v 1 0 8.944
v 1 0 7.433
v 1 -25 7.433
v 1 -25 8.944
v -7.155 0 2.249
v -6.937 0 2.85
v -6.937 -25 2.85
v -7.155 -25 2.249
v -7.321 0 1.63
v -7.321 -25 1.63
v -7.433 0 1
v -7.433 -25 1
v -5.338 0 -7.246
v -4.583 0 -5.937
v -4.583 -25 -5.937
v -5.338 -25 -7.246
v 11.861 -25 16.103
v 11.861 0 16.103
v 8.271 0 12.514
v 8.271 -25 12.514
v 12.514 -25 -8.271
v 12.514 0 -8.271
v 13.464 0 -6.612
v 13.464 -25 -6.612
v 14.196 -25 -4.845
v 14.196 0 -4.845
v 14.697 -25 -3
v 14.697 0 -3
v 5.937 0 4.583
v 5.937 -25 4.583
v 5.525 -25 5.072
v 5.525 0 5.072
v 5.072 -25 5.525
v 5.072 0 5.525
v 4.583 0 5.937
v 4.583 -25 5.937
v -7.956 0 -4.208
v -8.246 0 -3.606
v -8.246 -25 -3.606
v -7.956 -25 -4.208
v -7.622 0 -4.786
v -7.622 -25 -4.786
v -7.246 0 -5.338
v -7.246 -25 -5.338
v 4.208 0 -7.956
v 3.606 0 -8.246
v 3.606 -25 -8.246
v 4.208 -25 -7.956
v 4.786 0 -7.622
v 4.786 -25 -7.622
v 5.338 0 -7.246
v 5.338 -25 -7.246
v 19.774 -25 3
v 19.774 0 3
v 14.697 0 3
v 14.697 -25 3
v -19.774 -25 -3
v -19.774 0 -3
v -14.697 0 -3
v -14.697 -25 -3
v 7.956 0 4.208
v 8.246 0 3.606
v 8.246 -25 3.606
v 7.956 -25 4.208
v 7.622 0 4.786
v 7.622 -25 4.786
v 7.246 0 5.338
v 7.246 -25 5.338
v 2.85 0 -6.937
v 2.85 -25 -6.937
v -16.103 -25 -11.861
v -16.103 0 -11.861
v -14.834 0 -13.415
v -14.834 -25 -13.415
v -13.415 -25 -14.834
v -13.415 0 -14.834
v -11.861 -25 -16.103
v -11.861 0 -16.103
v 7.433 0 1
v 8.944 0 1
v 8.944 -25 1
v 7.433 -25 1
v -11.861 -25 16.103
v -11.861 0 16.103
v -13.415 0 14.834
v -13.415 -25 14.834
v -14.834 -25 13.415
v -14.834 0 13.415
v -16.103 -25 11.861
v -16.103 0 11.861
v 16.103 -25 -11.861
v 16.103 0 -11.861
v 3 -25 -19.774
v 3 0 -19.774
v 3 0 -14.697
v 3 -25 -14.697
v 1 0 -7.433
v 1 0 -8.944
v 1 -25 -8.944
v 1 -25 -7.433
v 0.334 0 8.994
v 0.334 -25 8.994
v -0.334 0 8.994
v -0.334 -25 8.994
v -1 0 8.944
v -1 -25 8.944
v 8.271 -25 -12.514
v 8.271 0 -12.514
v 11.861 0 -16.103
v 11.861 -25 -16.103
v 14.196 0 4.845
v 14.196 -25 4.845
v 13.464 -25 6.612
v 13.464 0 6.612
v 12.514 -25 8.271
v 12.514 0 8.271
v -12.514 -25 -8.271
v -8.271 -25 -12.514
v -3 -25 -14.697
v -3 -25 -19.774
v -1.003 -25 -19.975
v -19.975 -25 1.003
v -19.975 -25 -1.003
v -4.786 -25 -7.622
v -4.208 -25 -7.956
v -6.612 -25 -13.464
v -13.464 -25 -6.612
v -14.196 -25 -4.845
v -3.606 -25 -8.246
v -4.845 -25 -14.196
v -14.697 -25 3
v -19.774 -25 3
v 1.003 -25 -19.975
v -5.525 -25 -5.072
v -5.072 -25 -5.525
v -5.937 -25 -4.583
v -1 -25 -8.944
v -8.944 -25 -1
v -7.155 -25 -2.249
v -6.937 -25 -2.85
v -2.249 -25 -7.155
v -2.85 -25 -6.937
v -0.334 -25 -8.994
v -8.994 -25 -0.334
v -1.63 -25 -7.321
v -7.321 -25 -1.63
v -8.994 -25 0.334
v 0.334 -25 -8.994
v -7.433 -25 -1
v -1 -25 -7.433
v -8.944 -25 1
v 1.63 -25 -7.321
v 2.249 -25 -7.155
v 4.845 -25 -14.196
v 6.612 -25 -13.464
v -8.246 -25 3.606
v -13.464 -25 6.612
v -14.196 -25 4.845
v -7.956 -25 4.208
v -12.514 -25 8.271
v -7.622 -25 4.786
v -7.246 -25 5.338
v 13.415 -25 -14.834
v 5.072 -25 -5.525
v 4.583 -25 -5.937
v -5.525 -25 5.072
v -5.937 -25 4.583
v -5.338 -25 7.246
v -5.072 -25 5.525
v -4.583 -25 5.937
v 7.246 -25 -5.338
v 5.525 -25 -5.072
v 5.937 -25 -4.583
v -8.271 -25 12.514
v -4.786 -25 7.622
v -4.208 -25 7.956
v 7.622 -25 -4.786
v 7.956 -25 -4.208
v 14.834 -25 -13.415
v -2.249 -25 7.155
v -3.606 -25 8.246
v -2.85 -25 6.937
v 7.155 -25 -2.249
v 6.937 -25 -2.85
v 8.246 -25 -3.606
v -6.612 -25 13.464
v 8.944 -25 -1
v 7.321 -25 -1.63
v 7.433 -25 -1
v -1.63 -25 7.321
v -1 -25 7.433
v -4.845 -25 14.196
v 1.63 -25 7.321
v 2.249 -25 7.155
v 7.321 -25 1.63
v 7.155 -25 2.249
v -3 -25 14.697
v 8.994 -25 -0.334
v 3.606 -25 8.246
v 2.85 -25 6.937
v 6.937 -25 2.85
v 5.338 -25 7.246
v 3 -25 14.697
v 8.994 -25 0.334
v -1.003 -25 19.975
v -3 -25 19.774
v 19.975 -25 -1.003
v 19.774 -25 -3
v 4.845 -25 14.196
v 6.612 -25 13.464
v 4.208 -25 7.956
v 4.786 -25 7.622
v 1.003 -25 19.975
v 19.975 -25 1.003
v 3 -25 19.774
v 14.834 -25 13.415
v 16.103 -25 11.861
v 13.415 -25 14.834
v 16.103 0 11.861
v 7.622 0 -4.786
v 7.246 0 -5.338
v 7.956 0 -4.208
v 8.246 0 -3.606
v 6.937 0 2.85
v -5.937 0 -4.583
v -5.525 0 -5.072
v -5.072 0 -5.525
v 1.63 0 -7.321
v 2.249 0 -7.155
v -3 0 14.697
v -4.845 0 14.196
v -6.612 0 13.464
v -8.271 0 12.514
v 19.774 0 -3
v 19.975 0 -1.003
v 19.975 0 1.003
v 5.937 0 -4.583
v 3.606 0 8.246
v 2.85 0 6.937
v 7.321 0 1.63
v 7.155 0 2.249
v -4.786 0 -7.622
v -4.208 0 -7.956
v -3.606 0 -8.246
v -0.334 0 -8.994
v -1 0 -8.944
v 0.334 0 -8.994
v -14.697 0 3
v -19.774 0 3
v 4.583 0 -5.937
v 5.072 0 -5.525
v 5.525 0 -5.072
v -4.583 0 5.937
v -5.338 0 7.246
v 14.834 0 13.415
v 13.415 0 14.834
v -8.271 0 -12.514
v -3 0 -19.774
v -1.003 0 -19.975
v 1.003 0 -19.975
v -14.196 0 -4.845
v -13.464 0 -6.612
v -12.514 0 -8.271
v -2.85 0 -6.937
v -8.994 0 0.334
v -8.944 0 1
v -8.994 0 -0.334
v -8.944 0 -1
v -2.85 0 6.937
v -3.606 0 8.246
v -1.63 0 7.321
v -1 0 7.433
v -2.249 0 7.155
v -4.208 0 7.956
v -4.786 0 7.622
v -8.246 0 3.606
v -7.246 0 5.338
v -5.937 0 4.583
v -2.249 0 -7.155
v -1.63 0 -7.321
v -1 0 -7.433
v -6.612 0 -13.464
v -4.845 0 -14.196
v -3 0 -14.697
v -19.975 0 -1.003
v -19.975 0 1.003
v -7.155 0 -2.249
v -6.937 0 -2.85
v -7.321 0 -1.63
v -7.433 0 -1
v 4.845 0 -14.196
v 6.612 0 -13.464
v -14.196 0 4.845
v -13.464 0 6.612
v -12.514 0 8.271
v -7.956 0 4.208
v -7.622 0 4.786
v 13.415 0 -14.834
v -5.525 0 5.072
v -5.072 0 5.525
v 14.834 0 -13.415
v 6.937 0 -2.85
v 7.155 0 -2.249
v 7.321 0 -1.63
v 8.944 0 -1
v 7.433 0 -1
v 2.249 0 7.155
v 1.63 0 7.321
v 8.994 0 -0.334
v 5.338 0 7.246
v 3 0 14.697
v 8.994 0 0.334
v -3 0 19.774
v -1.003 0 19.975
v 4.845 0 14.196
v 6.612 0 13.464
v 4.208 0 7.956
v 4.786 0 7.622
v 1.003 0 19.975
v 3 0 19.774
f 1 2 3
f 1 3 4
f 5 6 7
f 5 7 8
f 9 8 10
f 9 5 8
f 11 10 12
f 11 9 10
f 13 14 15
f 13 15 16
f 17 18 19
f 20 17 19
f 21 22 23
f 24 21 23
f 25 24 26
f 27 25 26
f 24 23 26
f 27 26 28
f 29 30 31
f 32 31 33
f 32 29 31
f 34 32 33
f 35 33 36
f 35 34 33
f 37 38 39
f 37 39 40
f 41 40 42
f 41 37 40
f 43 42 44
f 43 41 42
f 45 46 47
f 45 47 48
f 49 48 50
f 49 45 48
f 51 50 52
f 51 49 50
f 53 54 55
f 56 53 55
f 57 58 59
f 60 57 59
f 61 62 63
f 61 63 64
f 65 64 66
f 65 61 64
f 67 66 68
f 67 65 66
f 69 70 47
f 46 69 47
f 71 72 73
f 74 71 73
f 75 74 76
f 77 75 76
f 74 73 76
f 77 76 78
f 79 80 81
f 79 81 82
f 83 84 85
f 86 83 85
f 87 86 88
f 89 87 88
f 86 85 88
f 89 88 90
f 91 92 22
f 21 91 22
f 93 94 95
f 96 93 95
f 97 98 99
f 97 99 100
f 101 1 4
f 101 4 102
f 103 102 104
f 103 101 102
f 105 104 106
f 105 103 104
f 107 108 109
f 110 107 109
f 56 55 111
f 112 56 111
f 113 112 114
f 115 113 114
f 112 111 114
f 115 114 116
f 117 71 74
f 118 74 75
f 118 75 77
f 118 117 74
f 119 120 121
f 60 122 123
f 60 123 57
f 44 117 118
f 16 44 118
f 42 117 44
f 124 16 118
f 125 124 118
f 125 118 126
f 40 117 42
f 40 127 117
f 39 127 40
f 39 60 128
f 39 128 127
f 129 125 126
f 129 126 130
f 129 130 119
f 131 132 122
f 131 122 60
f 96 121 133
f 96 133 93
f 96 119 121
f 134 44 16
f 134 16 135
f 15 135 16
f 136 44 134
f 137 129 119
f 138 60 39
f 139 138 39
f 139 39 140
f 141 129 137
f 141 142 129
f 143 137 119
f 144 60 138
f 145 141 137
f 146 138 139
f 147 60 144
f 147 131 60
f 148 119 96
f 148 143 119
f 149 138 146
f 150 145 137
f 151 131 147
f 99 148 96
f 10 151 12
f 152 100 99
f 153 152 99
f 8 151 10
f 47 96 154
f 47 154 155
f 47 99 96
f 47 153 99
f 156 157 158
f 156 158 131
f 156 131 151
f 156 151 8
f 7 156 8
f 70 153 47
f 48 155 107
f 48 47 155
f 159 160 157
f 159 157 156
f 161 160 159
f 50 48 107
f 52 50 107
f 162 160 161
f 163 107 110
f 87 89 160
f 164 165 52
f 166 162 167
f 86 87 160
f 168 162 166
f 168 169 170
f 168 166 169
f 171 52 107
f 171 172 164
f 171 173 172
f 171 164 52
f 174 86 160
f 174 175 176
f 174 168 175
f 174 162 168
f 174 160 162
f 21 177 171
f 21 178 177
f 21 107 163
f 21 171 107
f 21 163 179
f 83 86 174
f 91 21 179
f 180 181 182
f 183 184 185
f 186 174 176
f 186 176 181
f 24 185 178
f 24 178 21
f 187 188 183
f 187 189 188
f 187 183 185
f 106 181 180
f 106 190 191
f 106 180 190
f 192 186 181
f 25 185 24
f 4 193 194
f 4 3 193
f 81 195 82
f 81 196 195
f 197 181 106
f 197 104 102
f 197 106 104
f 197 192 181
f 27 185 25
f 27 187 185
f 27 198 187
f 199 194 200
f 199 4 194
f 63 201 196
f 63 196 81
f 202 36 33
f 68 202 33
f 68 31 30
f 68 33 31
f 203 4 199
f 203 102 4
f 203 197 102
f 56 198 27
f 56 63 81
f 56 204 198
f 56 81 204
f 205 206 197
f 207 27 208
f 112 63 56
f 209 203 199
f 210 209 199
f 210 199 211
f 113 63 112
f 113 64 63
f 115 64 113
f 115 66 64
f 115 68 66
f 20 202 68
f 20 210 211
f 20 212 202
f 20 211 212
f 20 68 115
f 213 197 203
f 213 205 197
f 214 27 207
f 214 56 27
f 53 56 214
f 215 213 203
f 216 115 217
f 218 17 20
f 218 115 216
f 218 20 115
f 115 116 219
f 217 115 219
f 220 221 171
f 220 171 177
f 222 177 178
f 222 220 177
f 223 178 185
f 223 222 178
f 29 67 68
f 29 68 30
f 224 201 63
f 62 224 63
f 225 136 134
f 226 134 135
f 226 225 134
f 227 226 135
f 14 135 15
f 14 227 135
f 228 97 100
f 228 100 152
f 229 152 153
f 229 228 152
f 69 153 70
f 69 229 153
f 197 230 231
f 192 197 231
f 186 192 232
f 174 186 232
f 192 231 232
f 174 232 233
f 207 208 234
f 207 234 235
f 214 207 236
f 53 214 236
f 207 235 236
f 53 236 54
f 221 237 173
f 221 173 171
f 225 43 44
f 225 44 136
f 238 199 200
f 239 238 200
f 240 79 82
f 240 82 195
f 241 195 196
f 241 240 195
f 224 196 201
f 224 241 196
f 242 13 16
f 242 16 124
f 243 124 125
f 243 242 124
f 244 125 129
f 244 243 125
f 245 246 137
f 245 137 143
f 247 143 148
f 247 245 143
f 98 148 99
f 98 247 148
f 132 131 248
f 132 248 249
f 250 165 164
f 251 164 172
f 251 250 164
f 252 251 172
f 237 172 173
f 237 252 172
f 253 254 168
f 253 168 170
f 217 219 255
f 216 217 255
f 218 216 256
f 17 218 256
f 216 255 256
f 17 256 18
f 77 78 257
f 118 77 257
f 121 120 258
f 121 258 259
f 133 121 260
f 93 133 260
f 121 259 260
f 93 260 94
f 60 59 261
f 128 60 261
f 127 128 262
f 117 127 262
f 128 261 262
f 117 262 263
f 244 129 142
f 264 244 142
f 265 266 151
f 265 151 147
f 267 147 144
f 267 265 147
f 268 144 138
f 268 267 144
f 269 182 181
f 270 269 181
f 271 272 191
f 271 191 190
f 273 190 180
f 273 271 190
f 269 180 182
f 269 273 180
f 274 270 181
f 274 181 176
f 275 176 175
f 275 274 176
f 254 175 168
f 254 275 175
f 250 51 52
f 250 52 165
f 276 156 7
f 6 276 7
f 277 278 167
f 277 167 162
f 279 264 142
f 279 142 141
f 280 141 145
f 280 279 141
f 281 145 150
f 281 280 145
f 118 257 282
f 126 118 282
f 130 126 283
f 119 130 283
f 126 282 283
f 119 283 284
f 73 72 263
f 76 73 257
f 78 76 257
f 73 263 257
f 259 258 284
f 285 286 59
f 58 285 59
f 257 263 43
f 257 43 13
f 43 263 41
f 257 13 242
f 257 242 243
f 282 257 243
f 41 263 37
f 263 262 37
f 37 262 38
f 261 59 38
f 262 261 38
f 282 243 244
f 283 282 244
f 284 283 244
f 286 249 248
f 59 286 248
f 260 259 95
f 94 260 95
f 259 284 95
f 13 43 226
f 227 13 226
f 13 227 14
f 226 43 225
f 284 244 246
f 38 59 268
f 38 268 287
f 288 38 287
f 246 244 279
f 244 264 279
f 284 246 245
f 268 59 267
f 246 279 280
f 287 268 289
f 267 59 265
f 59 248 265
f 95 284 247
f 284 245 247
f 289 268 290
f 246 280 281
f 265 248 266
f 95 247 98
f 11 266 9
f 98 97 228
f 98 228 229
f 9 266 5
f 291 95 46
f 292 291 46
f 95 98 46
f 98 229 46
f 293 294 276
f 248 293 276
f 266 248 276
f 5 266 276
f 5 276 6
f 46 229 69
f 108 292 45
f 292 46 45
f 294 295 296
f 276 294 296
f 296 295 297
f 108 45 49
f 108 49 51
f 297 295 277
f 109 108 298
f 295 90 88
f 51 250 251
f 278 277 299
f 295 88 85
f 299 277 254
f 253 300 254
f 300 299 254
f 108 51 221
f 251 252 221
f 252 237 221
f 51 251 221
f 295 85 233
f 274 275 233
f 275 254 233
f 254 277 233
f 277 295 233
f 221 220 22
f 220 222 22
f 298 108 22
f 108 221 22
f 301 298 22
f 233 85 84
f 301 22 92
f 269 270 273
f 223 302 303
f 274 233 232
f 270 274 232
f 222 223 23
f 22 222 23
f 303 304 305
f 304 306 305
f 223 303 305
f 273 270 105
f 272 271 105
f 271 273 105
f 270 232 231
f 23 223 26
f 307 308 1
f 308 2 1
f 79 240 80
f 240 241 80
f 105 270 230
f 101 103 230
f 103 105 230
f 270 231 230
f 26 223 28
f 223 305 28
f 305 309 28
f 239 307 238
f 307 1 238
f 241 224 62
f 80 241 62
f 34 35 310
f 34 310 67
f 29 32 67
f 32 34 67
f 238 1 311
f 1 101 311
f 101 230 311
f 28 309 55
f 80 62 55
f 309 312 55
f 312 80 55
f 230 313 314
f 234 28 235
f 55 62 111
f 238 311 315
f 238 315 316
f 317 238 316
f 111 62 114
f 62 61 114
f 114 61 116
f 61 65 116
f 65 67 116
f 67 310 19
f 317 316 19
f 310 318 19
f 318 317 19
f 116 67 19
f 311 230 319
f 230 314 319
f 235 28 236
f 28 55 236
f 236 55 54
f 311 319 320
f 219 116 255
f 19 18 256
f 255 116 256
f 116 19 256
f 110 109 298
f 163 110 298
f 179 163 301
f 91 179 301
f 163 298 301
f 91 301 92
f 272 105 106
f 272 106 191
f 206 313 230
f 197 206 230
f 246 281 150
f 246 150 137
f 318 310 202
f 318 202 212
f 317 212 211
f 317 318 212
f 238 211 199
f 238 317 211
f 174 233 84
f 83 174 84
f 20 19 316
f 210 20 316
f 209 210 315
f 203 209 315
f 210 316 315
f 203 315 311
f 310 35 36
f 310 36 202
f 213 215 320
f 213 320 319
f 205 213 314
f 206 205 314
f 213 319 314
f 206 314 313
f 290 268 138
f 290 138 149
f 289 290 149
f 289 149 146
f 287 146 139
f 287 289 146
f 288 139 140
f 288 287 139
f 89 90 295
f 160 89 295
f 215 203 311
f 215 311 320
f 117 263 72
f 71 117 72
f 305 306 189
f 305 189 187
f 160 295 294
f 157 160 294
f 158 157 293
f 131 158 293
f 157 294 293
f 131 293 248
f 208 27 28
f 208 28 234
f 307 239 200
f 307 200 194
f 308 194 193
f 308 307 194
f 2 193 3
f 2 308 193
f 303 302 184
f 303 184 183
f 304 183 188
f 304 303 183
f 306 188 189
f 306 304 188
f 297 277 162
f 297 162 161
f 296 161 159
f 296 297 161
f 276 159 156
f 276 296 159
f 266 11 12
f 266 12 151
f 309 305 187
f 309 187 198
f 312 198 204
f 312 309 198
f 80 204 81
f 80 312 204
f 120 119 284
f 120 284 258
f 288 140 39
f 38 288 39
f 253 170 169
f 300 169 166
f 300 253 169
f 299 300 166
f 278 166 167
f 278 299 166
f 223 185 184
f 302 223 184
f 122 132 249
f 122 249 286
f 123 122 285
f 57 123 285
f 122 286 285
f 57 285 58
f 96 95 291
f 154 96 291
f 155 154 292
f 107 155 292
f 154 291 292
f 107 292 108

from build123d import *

# Parameters (mm, degrees)
F2_DEPTH = 25
F3_DEPTH = 25


with BuildPart() as f2:
    # F1 (on Front) → F2 (new body)
    with BuildSketch(Plane.XZ):
        with BuildLine():
            ThreePointArc((14.696938, -3), (14.924042, -1.507634), (15, 0))
            ThreePointArc((15, 0), (14.924042, 1.507634), (14.696938, 3))
            ThreePointArc((14.696938, 3), (13.858193, 5.740251), (12.513625, 8.270985))
            ThreePointArc((12.513625, 8.270985), (10.606602, 10.606602), (8.270985, 12.513625))
            ThreePointArc((8.270985, 12.513625), (5.740251, 13.858193), (3, 14.696938))
            ThreePointArc((3, 14.696938), (0, 15), (-3, 14.696938))
            ThreePointArc((-3, 14.696938), (-5.740251, 13.858193), (-8.270985, 12.513625))
            ThreePointArc((-8.270985, 12.513625), (-10.606602, 10.606602), (-12.513625, 8.270985))
            ThreePointArc((-12.513625, 8.270985), (-13.858193, 5.740251), (-14.696938, 3))
            ThreePointArc((-14.696938, 3), (-15, 0), (-14.696938, -3))
            ThreePointArc((-14.696938, -3), (-13.858193, -5.740251), (-12.513625, -8.270985))
            ThreePointArc((-12.513625, -8.270985), (-10.606602, -10.606602), (-8.270985, -12.513625))
            ThreePointArc((-8.270985, -12.513625), (-5.740251, -13.858193), (-3, -14.696938))
            ThreePointArc((-3, -14.696938), (0, -15), (3, -14.696938))
            ThreePointArc((3, -14.696938), (5.740251, -13.858193), (8.270985, -12.513625))
            ThreePointArc((8.270985, -12.513625), (10.606602, -10.606602), (12.513625, -8.270985))
            ThreePointArc((12.513625, -8.270985), (13.858193, -5.740251), (14.696938, -3))
        make_face()
        with BuildLine():
            ThreePointArc((-12.513625, 8.270985), (-10.606602, 10.606602), (-8.270985, 12.513625))
            Line((-8.270985, 12.513625), (-11.860811, 16.103452))
            ThreePointArc((-11.860811, 16.103452), (-14.142136, 14.142136), (-16.103452, 11.860811))
            Line((-16.103452, 11.860811), (-12.513625, 8.270985))
        make_face()
        with BuildLine():
            ThreePointArc((-14.696938, -3), (-15, 0), (-14.696938, 3))
            Line((-14.696938, 3), (-19.77372, 3))
            ThreePointArc((-19.77372, 3), (-20, 0), (-19.77372, -3))
            Line((-19.77372, -3), (-14.696938, -3))
        make_face()
        with BuildLine():
            Line((-11.860811, -16.103452), (-8.270985, -12.513625))
            ThreePointArc((-8.270985, -12.513625), (-10.606602, -10.606602), (-12.513625, -8.270985))
            Line((-12.513625, -8.270985), (-16.103452, -11.860811))
            ThreePointArc((-16.103452, -11.860811), (-14.142136, -14.142136), (-11.860811, -16.103452))
        make_face()
        with BuildLine():
            Line((3, -19.77372), (3, -14.696938))
            ThreePointArc((3, -14.696938), (0, -15), (-3, -14.696938))
            Line((-3, -14.696938), (-3, -19.77372))
            ThreePointArc((-3, -19.77372), (0, -20), (3, -19.77372))
        make_face()
        with BuildLine():
            Line((16.103452, -11.860811), (12.513625, -8.270985))
            ThreePointArc((12.513625, -8.270985), (10.606602, -10.606602), (8.270985, -12.513625))
            Line((8.270985, -12.513625), (11.860811, -16.103452))
            ThreePointArc((11.860811, -16.103452), (14.142136, -14.142136), (16.103452, -11.860811))
        make_face()
        with BuildLine():
            ThreePointArc((14.696938, 3), (14.924042, 1.507634), (15, 0))
            ThreePointArc((15, 0), (14.924042, -1.507634), (14.696938, -3))
            Line((14.696938, -3), (19.77372, -3))
            ThreePointArc((19.77372, -3), (20, 0), (19.77372, 3))
            Line((19.77372, 3), (14.696938, 3))
        make_face()
        with BuildLine():
            ThreePointArc((8.270985, 12.513625), (10.606602, 10.606602), (12.513625, 8.270985))
            Line((12.513625, 8.270985), (16.103452, 11.860811))
            ThreePointArc((16.103452, 11.860811), (14.142136, 14.142136), (11.860811, 16.103452))
            Line((11.860811, 16.103452), (8.270985, 12.513625))
        make_face()
        with BuildLine():
            ThreePointArc((-3, 14.696938), (0, 15), (3, 14.696938))
            Line((3, 14.696938), (3, 19.77372))
            ThreePointArc((3, 19.77372), (0, 20), (-3, 19.77372))
            Line((-3, 19.77372), (-3, 14.696938))
        make_face()
    extrude(amount=F2_DEPTH)

    # F0 (on Front) → F3 (cut)
    with BuildSketch(Plane.XZ):
        with BuildLine():
            Line((-5.338161, 7.245967), (-4.582543, 5.937197))
            ThreePointArc((-4.582543, 5.937197), (-5.303301, 5.303301), (-5.937197, 4.582543))
            Line((-5.937197, 4.582543), (-7.245967, 5.338161))
            ThreePointArc((-7.245967, 5.338161), (-7.794229, 4.5), (-8.245967, 3.606111))
            Line((-8.245967, 3.606111), (-6.937197, 2.850492))
            ThreePointArc((-6.937197, 2.850492), (-7.244444, 1.941143), (-7.433034, 1))
            Line((-7.433034, 1), (-8.944272, 1))
            ThreePointArc((-8.944272, 1), (-9, 0), (-8.944272, -1))
            Line((-8.944272, -1), (-7.433034, -1))
            ThreePointArc((-7.433034, -1), (-7.244444, -1.941143), (-6.937197, -2.850492))
            Line((-6.937197, -2.850492), (-8.245967, -3.606111))
            ThreePointArc((-8.245967, -3.606111), (-7.794229, -4.5), (-7.245967, -5.338161))
            Line((-7.245967, -5.338161), (-5.937197, -4.582543))
            ThreePointArc((-5.937197, -4.582543), (-5.303301, -5.303301), (-4.582543, -5.937197))
            Line((-4.582543, -5.937197), (-5.338161, -7.245967))
            ThreePointArc((-5.338161, -7.245967), (-4.5, -7.794229), (-3.606111, -8.245967))
            Line((-3.606111, -8.245967), (-2.850492, -6.937197))
            ThreePointArc((-2.850492, -6.937197), (-1.941143, -7.244444), (-1, -7.433034))
            Line((-1, -7.433034), (-1, -8.944272))
            ThreePointArc((-1, -8.944272), (0, -9), (1, -8.944272))
            Line((1, -8.944272), (1, -7.433034))
            ThreePointArc((1, -7.433034), (1.941143, -7.244444), (2.850492, -6.937197))
            Line((2.850492, -6.937197), (3.606111, -8.245967))
            ThreePointArc((3.606111, -8.245967), (4.5, -7.794229), (5.338161, -7.245967))
            Line((5.338161, -7.245967), (4.582543, -5.937197))
            ThreePointArc((4.582543, -5.937197), (5.303301, -5.303301), (5.937197, -4.582543))
            Line((5.937197, -4.582543), (7.245967, -5.338161))
            ThreePointArc((7.245967, -5.338161), (7.794229, -4.5), (8.245967, -3.606111))
            Line((8.245967, -3.606111), (6.937197, -2.850492))
            ThreePointArc((6.937197, -2.850492), (7.244444, -1.941143), (7.433034, -1))
            Line((7.433034, -1), (8.944272, -1))
            ThreePointArc((8.944272, -1), (9, 0), (8.944272, 1))
            Line((8.944272, 1), (7.433034, 1))
            ThreePointArc((7.433034, 1), (7.244444, 1.941143), (6.937197, 2.850492))
            Line((6.937197, 2.850492), (8.245967, 3.606111))
            ThreePointArc((8.245967, 3.606111), (7.794229, 4.5), (7.245967, 5.338161))
            Line((7.245967, 5.338161), (5.937197, 4.582543))
            ThreePointArc((5.937197, 4.582543), (5.303301, 5.303301), (4.582543, 5.937197))
            Line((4.582543, 5.937197), (5.338161, 7.245967))
            ThreePointArc((5.338161, 7.245967), (4.5, 7.794229), (3.606111, 8.245967))
            Line((3.606111, 8.245967), (2.850492, 6.937197))
            ThreePointArc((2.850492, 6.937197), (1.941143, 7.244444), (1, 7.433034))
            Line((1, 7.433034), (1, 8.944272))
            ThreePointArc((1, 8.944272), (0, 9), (-1, 8.944272))
            Line((-1, 8.944272), (-1, 7.433034))
            ThreePointArc((-1, 7.433034), (-1.941143, 7.244444), (-2.850492, 6.937197))
            Line((-2.850492, 6.937197), (-3.606111, 8.245967))
            ThreePointArc((-3.606111, 8.245967), (-4.5, 7.794229), (-5.338161, 7.245967))
        make_face()
    extrude(amount=F3_DEPTH, mode=Mode.SUBTRACT)


solid = f2.part
